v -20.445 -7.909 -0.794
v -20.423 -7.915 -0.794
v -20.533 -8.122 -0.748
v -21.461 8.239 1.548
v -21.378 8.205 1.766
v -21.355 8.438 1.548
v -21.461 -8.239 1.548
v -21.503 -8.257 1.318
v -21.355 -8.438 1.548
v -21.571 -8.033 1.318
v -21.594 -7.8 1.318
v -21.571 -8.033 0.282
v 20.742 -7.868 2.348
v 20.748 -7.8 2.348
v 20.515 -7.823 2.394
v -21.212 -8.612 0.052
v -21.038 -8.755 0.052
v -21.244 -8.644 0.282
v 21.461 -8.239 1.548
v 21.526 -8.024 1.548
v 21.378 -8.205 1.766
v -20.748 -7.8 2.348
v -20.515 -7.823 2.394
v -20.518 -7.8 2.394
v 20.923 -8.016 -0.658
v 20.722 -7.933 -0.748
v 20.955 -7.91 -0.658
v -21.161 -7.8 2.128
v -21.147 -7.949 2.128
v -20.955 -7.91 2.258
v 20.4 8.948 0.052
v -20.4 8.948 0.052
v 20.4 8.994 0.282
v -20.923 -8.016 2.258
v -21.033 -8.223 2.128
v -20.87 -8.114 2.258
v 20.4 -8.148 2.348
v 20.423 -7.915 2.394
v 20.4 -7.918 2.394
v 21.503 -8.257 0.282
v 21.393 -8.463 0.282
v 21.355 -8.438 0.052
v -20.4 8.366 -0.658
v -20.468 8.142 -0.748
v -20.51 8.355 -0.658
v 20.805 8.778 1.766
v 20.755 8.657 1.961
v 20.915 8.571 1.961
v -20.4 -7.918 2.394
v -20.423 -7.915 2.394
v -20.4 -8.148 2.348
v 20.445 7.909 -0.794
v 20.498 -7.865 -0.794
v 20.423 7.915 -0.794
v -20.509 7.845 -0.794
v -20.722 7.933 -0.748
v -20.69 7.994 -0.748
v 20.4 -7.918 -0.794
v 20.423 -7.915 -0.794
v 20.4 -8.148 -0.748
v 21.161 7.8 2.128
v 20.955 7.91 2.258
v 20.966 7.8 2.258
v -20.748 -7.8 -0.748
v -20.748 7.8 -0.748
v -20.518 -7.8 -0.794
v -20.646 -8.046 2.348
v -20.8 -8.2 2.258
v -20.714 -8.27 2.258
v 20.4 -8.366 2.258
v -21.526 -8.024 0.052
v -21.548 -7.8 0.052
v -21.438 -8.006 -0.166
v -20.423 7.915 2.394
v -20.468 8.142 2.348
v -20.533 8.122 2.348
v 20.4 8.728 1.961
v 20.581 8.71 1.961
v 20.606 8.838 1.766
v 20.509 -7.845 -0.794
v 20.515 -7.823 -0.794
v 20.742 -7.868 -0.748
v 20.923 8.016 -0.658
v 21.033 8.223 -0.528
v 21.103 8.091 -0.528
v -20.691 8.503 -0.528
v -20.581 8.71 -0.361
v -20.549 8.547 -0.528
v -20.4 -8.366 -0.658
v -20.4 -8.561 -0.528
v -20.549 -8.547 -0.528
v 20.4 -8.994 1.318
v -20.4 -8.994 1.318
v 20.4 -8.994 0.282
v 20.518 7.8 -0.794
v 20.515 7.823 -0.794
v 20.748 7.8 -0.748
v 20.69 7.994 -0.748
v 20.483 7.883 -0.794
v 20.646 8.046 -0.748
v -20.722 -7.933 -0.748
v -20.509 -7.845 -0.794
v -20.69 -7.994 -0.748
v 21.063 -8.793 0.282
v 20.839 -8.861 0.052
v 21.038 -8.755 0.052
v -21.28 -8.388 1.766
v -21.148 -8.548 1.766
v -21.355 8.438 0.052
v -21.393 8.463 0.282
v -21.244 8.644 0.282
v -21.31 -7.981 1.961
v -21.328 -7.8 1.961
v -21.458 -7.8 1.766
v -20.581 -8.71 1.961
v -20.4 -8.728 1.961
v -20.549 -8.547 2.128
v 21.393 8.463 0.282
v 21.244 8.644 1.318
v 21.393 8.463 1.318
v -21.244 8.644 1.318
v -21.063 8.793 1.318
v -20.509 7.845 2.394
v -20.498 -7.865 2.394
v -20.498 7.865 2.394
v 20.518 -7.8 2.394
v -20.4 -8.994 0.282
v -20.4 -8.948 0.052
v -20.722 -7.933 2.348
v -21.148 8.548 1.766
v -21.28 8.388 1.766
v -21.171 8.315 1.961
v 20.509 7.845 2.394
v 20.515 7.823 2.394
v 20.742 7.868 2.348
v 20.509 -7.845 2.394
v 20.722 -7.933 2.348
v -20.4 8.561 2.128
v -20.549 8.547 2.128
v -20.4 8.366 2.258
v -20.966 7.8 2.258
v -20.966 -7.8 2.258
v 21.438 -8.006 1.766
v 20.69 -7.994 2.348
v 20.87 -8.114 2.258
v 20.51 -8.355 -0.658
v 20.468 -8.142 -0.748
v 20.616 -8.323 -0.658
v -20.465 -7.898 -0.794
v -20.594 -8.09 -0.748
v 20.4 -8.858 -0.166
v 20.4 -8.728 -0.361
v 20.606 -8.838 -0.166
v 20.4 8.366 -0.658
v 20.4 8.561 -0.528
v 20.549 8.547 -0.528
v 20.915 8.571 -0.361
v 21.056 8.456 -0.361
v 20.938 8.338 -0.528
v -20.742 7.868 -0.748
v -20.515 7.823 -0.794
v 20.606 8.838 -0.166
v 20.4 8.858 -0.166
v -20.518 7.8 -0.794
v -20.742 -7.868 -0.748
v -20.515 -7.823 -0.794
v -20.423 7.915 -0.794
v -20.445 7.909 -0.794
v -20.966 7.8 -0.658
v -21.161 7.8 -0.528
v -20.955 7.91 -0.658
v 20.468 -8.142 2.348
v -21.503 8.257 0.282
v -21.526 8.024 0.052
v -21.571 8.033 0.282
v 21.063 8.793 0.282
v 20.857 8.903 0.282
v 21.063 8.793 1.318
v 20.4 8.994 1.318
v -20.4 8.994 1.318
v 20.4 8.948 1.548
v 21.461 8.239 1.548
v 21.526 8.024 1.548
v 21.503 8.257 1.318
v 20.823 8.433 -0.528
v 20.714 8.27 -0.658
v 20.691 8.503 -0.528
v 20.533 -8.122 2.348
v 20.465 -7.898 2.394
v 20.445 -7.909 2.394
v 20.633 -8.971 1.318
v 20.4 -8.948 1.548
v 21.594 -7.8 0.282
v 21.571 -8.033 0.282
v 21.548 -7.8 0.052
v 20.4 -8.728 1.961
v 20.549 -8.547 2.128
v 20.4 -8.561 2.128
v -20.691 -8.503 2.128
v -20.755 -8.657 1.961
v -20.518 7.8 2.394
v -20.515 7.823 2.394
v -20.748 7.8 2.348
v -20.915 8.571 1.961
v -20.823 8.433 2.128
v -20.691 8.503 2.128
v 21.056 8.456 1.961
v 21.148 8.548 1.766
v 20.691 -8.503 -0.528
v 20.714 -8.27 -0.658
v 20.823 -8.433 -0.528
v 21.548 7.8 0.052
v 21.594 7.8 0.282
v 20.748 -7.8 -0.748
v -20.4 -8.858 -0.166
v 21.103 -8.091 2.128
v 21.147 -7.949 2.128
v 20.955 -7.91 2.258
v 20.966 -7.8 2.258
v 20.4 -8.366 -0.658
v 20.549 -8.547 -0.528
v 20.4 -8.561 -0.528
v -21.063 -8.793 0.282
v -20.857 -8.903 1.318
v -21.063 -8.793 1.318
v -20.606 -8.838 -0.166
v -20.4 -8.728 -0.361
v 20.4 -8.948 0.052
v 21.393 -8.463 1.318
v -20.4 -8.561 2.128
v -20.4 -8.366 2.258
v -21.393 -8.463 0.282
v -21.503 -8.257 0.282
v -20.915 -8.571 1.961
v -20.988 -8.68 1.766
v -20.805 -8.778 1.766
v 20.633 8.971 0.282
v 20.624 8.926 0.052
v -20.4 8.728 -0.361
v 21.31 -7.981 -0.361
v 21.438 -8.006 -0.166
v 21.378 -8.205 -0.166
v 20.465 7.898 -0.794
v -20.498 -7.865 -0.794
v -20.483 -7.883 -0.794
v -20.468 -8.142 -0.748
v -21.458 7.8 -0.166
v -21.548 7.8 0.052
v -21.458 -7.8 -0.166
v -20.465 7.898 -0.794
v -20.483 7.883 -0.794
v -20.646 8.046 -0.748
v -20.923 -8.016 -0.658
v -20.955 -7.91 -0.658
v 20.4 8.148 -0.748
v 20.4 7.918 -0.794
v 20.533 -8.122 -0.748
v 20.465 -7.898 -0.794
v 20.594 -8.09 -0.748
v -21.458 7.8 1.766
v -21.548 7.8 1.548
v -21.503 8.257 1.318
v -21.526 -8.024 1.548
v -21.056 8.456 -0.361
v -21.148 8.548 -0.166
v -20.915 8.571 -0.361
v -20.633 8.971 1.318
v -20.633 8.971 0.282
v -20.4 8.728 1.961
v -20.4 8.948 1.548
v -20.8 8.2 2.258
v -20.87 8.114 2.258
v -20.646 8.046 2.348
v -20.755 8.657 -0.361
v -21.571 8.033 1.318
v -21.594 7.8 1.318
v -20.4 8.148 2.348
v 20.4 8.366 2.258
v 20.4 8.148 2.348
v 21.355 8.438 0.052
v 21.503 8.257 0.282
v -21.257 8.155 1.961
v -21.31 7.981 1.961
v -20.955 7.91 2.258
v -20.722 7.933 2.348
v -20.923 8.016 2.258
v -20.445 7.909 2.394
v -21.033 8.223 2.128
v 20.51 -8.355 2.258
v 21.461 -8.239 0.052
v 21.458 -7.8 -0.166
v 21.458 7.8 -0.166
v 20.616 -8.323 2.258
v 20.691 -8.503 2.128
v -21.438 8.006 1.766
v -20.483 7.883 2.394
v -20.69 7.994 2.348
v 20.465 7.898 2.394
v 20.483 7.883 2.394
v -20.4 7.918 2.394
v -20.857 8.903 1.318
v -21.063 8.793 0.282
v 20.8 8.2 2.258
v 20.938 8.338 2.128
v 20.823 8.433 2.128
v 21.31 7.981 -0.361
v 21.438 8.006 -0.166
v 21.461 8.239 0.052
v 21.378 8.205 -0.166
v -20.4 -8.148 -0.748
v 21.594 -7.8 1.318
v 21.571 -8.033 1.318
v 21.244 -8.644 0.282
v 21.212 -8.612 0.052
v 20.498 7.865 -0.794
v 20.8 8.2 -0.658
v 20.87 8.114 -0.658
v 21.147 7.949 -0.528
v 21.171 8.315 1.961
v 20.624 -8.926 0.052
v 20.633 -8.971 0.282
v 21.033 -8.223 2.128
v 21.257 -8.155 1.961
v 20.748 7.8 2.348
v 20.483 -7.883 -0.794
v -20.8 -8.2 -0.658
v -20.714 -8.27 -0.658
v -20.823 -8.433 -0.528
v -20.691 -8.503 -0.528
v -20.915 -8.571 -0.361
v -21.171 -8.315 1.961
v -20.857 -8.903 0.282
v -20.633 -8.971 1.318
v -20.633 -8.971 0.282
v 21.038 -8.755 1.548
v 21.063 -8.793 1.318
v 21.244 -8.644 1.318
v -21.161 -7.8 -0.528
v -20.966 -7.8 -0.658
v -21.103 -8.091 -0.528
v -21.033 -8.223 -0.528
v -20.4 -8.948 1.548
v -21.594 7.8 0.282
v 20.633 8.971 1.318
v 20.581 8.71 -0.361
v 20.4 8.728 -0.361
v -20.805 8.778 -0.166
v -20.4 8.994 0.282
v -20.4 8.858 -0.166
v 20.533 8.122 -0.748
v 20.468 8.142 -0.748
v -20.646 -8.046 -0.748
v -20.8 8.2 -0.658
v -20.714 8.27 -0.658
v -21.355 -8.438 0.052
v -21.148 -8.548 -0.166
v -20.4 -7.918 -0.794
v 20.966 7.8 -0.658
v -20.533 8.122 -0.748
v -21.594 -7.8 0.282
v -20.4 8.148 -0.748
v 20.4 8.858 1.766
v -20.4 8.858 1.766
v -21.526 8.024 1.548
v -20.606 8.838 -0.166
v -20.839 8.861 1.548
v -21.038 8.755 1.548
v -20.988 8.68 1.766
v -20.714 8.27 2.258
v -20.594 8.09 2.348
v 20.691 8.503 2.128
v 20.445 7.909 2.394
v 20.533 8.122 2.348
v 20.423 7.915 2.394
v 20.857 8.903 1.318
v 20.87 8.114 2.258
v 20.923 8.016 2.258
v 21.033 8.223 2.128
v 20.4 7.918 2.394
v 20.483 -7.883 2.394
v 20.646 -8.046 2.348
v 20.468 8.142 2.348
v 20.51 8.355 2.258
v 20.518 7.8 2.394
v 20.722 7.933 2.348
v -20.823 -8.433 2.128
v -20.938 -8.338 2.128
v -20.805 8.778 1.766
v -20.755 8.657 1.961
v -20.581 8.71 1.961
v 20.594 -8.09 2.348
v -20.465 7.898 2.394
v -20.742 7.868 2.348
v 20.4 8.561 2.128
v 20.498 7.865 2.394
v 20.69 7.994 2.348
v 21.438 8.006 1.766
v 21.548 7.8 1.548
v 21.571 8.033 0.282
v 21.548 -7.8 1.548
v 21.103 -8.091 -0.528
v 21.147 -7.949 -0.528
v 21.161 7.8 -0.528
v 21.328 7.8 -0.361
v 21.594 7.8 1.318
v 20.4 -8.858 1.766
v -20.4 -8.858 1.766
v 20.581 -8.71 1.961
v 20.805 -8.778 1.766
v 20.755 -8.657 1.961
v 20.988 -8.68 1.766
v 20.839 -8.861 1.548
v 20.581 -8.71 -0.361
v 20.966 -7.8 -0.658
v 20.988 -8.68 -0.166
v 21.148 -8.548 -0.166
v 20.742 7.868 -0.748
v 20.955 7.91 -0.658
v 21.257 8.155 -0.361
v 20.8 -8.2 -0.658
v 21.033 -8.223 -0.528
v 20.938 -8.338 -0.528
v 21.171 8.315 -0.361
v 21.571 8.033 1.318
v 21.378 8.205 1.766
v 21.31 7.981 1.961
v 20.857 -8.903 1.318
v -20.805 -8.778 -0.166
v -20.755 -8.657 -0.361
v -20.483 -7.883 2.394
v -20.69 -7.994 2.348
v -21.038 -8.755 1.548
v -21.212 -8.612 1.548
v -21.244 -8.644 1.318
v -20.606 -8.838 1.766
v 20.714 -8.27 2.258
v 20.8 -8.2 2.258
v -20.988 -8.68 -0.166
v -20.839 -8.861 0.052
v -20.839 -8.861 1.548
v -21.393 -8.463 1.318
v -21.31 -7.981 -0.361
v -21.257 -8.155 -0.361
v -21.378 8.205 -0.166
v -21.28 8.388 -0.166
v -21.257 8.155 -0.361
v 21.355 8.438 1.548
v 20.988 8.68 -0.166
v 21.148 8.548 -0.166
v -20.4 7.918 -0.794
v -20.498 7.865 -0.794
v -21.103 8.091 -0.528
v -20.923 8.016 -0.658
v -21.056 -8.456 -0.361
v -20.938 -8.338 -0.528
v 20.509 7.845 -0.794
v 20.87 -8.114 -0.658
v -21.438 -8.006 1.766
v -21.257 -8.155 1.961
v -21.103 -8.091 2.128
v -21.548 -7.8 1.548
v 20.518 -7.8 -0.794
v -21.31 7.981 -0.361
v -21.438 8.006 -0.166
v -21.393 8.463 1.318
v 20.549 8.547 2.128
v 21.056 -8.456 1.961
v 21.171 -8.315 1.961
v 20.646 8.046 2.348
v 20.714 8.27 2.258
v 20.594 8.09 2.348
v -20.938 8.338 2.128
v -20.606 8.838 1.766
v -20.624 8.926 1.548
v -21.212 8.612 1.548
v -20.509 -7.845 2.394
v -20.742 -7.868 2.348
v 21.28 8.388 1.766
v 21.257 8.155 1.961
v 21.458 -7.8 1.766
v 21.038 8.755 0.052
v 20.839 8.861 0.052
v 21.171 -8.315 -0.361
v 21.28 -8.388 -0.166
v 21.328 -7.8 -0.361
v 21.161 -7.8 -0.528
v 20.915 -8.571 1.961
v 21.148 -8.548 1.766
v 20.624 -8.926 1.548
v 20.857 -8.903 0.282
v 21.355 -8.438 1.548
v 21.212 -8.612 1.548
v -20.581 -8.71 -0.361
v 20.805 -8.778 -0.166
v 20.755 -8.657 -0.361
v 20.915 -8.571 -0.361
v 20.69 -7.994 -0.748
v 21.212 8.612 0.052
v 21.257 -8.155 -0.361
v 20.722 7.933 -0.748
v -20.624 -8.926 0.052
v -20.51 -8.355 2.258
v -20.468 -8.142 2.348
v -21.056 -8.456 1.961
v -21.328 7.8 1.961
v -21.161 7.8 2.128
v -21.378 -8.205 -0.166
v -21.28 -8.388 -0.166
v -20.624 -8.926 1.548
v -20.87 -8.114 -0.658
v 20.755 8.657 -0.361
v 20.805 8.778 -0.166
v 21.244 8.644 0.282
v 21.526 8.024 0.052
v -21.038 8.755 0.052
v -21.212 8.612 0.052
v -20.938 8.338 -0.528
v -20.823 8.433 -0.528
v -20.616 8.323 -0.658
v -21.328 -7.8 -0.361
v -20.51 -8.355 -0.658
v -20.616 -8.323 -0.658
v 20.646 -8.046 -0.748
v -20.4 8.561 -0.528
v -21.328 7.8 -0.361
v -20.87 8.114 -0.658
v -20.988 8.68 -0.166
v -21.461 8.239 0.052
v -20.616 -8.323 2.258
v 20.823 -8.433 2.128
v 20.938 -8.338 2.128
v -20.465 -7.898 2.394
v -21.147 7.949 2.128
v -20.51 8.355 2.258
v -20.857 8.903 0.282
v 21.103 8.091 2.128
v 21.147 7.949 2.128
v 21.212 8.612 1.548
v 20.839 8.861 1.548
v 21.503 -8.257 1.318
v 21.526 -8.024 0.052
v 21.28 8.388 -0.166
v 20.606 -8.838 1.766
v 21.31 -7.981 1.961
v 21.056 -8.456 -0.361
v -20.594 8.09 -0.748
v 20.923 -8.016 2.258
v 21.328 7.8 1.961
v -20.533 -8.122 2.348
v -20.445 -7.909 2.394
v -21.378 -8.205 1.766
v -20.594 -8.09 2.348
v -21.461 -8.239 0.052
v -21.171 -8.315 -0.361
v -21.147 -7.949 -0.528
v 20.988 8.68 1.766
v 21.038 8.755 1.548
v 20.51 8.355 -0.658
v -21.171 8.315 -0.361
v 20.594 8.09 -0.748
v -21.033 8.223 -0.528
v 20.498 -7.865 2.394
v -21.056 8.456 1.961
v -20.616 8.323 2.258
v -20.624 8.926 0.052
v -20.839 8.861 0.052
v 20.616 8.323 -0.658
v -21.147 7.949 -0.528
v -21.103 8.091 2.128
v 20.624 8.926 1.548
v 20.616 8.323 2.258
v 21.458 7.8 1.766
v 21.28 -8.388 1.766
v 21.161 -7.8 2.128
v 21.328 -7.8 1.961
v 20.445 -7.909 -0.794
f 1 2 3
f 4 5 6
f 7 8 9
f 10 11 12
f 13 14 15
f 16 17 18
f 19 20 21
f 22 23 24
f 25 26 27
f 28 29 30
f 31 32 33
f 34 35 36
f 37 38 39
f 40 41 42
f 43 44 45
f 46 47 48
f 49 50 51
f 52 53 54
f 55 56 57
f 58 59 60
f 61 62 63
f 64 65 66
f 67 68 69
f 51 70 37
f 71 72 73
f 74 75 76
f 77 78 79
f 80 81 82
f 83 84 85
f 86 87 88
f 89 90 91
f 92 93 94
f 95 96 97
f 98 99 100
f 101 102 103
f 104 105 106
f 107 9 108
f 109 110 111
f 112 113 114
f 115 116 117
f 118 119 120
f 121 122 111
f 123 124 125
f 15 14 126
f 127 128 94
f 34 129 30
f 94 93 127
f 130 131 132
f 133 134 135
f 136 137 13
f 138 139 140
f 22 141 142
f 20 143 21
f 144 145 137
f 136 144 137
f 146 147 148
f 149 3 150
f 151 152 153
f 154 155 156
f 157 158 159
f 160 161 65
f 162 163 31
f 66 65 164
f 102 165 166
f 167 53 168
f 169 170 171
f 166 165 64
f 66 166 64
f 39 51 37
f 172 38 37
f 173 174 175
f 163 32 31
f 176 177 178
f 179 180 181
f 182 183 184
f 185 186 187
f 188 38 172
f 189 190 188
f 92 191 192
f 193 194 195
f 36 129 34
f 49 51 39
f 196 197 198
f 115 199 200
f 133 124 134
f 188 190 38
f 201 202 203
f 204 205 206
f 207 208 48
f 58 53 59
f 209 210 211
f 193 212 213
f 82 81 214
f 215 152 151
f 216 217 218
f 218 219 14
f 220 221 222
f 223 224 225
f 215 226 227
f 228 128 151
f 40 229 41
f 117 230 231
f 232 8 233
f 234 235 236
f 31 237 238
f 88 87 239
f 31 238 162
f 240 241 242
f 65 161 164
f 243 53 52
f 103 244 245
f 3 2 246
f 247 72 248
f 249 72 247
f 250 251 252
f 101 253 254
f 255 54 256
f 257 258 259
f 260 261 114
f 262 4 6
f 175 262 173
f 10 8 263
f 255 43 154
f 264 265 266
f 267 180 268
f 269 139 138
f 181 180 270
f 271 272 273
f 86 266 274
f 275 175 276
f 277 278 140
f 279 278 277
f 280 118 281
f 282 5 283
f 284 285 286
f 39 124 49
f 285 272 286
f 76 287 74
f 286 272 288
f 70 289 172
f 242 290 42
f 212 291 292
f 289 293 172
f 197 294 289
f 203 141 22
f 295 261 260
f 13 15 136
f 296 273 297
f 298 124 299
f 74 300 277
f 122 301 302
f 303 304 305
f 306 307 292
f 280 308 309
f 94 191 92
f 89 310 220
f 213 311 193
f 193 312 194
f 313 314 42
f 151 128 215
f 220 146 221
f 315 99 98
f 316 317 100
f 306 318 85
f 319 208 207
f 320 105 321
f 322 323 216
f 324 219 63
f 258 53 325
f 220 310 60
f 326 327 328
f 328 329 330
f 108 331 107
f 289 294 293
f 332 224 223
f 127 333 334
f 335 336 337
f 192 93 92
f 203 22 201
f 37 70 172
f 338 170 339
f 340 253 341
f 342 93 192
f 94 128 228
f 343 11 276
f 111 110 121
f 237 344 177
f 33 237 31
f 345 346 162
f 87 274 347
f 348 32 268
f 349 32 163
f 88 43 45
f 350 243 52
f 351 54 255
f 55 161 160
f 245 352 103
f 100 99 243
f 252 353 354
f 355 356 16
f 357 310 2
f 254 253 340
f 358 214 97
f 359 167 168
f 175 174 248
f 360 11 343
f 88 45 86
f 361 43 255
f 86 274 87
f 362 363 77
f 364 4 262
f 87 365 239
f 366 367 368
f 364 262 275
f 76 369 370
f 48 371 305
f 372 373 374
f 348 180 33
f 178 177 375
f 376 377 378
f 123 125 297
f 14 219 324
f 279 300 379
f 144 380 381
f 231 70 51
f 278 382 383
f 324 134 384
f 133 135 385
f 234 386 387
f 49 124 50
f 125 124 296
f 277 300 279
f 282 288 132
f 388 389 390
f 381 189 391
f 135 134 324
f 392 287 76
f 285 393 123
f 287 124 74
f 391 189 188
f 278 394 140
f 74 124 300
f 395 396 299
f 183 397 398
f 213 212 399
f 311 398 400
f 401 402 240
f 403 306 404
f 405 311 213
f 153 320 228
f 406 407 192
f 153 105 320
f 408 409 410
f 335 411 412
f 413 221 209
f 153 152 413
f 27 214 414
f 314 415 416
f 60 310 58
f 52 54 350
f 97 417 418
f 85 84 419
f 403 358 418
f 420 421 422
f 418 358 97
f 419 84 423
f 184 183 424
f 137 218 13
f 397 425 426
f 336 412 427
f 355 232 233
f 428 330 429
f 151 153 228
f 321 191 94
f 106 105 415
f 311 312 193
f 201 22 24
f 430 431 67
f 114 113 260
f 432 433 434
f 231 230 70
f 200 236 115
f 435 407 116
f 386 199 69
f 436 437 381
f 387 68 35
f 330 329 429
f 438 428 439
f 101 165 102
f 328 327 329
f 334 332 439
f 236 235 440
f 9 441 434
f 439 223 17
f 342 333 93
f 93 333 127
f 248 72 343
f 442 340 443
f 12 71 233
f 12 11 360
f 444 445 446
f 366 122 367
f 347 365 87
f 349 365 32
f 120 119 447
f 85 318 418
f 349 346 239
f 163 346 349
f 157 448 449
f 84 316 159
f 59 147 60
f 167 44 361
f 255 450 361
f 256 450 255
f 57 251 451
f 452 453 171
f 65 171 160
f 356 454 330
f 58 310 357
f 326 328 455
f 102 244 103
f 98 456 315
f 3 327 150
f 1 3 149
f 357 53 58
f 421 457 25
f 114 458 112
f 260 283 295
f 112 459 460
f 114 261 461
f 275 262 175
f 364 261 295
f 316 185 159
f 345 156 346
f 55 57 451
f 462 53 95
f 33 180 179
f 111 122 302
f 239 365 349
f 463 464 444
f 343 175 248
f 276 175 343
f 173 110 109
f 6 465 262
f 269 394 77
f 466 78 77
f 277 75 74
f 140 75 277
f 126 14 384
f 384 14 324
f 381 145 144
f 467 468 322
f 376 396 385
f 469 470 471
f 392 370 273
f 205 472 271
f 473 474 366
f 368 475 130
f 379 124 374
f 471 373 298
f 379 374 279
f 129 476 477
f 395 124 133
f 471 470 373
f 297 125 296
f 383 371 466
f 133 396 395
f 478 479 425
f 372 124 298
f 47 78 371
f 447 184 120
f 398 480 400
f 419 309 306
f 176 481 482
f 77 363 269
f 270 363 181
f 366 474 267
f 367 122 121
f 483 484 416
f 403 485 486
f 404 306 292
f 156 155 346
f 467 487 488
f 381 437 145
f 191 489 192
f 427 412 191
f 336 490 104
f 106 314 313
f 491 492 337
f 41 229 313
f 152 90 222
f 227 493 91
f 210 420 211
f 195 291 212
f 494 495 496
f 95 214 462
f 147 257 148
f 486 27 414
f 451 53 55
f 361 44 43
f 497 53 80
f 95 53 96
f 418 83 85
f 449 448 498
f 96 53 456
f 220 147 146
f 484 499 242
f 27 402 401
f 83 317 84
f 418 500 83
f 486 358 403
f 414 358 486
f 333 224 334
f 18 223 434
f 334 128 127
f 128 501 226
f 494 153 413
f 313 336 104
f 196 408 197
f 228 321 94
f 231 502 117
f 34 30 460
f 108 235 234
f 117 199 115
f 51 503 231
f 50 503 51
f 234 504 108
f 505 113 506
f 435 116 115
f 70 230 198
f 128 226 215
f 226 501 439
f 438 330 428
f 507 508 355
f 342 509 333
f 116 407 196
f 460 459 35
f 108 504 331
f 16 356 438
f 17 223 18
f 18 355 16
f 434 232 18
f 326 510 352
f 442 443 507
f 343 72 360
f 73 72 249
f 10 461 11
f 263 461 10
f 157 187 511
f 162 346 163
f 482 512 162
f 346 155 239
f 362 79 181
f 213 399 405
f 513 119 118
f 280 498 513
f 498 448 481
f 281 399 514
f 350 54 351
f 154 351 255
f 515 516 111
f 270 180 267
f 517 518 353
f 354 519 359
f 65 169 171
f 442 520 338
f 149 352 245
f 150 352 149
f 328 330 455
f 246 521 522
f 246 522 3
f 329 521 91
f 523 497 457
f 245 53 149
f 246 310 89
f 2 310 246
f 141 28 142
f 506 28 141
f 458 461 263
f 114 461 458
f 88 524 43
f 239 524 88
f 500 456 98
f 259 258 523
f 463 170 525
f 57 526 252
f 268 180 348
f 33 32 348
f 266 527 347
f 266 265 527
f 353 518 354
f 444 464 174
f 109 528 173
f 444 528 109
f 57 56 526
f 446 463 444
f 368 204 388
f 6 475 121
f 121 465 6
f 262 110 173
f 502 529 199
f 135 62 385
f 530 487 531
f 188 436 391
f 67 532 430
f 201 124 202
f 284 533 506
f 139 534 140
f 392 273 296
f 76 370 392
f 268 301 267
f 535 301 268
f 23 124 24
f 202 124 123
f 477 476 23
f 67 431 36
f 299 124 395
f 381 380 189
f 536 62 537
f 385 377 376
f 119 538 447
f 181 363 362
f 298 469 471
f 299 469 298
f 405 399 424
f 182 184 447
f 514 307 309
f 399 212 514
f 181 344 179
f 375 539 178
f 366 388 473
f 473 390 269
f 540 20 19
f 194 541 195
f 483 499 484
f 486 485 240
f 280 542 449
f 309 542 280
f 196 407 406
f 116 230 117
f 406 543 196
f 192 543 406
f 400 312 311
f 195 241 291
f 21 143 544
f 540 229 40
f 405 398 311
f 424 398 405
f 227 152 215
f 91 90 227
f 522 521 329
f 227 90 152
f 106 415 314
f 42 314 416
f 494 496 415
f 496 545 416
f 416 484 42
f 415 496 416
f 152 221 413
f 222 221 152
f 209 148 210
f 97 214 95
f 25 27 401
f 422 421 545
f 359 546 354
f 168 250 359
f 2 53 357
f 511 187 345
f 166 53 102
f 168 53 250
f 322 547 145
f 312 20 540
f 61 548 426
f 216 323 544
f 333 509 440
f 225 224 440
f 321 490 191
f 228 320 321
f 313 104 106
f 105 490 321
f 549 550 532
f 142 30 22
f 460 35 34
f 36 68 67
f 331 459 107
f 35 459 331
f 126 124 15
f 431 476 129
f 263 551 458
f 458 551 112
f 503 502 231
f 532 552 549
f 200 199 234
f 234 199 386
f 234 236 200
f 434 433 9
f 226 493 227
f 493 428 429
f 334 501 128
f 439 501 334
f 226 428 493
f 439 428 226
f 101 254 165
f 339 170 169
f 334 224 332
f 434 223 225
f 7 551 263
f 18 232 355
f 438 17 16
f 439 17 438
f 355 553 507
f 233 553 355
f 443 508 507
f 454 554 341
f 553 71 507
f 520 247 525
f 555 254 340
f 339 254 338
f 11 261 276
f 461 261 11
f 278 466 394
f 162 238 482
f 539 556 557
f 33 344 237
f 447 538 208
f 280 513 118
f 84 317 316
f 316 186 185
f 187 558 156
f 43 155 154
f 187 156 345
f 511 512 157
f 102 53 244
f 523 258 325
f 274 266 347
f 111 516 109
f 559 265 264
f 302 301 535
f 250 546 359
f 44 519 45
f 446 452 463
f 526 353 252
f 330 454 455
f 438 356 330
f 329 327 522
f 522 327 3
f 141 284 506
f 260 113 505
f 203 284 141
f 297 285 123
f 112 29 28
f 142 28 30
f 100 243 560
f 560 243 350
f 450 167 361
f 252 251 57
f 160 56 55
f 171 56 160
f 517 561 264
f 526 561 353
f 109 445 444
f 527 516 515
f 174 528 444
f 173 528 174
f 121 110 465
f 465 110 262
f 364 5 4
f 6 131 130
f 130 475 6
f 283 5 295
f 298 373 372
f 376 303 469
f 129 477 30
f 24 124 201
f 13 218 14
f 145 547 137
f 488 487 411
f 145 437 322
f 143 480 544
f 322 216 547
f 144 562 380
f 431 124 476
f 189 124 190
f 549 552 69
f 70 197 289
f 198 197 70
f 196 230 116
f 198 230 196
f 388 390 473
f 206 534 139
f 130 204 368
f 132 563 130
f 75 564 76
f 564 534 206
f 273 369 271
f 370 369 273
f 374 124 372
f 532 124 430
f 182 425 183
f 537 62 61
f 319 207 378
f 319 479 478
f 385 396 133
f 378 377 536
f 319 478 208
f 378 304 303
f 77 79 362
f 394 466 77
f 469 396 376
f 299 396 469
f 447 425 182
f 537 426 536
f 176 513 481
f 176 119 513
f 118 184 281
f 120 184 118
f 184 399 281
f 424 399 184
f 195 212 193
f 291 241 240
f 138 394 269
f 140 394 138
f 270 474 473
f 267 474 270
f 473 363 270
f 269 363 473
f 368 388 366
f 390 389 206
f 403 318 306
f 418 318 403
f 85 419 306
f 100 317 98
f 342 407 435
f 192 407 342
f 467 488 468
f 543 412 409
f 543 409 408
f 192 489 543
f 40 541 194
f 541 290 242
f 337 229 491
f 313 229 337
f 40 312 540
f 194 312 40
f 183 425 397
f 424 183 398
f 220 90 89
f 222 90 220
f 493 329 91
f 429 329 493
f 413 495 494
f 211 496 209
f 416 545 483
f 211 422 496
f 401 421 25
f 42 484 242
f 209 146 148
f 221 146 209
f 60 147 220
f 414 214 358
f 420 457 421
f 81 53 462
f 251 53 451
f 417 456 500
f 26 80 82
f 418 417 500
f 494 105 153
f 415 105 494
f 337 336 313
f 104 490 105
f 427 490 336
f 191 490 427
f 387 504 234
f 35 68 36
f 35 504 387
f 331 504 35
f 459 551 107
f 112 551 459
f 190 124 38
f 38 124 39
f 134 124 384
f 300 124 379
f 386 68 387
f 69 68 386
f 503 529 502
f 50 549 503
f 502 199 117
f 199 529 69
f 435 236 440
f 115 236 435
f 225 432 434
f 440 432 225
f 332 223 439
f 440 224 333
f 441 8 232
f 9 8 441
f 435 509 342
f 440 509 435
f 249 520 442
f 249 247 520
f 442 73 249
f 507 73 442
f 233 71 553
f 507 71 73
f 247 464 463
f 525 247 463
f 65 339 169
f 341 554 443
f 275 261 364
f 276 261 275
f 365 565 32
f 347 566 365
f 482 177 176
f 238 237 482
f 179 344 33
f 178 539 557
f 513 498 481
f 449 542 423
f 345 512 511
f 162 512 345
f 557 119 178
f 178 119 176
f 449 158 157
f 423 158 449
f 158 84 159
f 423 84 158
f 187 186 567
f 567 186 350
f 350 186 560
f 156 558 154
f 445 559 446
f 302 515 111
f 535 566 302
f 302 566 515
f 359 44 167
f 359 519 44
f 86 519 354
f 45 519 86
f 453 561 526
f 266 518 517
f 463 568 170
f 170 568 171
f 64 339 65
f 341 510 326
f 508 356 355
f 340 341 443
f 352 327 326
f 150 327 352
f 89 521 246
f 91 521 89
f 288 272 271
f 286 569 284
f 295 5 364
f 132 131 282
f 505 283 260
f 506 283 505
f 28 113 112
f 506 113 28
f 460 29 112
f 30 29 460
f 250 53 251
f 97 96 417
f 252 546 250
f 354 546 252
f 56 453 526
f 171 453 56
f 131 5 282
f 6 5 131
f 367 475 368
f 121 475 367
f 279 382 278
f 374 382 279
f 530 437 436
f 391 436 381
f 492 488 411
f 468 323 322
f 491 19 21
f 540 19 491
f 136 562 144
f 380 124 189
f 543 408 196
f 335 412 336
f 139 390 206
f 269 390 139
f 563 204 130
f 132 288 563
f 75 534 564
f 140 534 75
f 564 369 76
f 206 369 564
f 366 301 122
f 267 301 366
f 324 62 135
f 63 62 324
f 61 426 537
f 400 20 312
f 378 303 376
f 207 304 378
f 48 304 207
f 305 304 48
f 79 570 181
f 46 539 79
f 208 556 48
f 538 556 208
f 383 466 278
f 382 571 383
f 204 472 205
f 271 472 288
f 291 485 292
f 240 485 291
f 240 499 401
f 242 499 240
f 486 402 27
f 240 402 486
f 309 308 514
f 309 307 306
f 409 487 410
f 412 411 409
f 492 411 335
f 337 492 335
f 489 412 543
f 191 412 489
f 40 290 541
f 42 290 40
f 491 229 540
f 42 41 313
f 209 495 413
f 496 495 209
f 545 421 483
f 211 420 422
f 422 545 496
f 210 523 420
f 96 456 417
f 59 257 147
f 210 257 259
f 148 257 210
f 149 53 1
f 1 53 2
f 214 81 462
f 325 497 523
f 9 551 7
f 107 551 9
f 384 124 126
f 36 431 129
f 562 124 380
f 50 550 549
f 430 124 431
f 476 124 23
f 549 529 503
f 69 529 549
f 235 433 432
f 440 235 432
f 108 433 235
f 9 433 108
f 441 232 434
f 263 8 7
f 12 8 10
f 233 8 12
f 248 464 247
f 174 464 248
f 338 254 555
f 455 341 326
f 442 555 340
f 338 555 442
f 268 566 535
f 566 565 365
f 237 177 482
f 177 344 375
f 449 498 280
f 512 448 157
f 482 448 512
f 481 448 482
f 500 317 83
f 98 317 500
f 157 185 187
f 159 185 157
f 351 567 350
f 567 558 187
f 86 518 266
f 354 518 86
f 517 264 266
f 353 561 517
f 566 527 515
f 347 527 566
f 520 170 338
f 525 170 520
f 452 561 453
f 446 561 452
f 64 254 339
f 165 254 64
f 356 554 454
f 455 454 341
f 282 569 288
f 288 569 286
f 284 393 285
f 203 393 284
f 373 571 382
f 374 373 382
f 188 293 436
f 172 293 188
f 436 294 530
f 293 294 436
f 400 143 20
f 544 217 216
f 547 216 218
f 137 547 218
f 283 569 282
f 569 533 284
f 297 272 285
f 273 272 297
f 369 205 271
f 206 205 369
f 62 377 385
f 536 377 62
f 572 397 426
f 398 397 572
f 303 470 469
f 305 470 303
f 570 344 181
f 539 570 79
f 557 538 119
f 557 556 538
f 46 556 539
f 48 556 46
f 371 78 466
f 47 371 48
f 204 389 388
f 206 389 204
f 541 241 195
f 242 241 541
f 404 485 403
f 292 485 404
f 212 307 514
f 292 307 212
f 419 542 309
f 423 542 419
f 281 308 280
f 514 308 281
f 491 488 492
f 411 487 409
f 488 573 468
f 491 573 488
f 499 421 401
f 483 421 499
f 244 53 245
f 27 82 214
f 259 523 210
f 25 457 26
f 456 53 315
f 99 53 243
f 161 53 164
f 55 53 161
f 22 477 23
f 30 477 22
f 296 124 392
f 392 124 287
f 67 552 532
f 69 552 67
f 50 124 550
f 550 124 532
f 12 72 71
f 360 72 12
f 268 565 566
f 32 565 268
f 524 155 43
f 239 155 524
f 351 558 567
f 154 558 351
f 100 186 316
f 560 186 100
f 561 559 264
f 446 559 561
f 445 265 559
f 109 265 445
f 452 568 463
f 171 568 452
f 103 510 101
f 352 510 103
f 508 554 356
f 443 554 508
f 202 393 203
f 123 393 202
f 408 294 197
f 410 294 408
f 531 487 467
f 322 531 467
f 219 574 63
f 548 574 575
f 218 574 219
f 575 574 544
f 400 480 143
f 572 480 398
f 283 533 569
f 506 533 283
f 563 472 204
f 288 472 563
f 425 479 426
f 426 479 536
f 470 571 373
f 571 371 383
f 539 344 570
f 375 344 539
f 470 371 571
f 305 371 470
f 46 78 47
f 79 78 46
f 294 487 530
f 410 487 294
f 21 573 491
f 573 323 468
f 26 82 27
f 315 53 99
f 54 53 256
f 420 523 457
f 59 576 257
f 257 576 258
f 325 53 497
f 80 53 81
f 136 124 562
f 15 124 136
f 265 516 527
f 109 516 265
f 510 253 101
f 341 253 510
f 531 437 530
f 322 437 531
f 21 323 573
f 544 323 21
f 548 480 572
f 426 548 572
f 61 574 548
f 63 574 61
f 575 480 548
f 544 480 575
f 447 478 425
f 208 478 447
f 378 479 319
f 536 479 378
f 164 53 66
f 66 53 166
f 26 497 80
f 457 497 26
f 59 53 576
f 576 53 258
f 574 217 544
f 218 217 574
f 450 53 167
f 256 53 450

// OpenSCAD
// Arduino Nano (Arduino Nano) visual source for NexCAD.
// Units: millimeters. Origin: part bottom-center, matching src/parts/library.ts.
// This generated baseline is intentionally simple; refine it with measured details before exporting STL.

$fn = 32;

module rounded_box(size, r = 0.8) {
  hull() {
    for (x = [-size[0] / 2 + r, size[0] / 2 - r])
      for (y = [-size[1] / 2 + r, size[1] / 2 - r]) {
        translate([x, y, r]) sphere(r = r);
        translate([x, y, size[2] - r]) sphere(r = r);
      }
  }
}

color("#2e7d5b") rounded_box([43.2, 18, 1.6], min(1.2, min(43.2, 18) / 8));
